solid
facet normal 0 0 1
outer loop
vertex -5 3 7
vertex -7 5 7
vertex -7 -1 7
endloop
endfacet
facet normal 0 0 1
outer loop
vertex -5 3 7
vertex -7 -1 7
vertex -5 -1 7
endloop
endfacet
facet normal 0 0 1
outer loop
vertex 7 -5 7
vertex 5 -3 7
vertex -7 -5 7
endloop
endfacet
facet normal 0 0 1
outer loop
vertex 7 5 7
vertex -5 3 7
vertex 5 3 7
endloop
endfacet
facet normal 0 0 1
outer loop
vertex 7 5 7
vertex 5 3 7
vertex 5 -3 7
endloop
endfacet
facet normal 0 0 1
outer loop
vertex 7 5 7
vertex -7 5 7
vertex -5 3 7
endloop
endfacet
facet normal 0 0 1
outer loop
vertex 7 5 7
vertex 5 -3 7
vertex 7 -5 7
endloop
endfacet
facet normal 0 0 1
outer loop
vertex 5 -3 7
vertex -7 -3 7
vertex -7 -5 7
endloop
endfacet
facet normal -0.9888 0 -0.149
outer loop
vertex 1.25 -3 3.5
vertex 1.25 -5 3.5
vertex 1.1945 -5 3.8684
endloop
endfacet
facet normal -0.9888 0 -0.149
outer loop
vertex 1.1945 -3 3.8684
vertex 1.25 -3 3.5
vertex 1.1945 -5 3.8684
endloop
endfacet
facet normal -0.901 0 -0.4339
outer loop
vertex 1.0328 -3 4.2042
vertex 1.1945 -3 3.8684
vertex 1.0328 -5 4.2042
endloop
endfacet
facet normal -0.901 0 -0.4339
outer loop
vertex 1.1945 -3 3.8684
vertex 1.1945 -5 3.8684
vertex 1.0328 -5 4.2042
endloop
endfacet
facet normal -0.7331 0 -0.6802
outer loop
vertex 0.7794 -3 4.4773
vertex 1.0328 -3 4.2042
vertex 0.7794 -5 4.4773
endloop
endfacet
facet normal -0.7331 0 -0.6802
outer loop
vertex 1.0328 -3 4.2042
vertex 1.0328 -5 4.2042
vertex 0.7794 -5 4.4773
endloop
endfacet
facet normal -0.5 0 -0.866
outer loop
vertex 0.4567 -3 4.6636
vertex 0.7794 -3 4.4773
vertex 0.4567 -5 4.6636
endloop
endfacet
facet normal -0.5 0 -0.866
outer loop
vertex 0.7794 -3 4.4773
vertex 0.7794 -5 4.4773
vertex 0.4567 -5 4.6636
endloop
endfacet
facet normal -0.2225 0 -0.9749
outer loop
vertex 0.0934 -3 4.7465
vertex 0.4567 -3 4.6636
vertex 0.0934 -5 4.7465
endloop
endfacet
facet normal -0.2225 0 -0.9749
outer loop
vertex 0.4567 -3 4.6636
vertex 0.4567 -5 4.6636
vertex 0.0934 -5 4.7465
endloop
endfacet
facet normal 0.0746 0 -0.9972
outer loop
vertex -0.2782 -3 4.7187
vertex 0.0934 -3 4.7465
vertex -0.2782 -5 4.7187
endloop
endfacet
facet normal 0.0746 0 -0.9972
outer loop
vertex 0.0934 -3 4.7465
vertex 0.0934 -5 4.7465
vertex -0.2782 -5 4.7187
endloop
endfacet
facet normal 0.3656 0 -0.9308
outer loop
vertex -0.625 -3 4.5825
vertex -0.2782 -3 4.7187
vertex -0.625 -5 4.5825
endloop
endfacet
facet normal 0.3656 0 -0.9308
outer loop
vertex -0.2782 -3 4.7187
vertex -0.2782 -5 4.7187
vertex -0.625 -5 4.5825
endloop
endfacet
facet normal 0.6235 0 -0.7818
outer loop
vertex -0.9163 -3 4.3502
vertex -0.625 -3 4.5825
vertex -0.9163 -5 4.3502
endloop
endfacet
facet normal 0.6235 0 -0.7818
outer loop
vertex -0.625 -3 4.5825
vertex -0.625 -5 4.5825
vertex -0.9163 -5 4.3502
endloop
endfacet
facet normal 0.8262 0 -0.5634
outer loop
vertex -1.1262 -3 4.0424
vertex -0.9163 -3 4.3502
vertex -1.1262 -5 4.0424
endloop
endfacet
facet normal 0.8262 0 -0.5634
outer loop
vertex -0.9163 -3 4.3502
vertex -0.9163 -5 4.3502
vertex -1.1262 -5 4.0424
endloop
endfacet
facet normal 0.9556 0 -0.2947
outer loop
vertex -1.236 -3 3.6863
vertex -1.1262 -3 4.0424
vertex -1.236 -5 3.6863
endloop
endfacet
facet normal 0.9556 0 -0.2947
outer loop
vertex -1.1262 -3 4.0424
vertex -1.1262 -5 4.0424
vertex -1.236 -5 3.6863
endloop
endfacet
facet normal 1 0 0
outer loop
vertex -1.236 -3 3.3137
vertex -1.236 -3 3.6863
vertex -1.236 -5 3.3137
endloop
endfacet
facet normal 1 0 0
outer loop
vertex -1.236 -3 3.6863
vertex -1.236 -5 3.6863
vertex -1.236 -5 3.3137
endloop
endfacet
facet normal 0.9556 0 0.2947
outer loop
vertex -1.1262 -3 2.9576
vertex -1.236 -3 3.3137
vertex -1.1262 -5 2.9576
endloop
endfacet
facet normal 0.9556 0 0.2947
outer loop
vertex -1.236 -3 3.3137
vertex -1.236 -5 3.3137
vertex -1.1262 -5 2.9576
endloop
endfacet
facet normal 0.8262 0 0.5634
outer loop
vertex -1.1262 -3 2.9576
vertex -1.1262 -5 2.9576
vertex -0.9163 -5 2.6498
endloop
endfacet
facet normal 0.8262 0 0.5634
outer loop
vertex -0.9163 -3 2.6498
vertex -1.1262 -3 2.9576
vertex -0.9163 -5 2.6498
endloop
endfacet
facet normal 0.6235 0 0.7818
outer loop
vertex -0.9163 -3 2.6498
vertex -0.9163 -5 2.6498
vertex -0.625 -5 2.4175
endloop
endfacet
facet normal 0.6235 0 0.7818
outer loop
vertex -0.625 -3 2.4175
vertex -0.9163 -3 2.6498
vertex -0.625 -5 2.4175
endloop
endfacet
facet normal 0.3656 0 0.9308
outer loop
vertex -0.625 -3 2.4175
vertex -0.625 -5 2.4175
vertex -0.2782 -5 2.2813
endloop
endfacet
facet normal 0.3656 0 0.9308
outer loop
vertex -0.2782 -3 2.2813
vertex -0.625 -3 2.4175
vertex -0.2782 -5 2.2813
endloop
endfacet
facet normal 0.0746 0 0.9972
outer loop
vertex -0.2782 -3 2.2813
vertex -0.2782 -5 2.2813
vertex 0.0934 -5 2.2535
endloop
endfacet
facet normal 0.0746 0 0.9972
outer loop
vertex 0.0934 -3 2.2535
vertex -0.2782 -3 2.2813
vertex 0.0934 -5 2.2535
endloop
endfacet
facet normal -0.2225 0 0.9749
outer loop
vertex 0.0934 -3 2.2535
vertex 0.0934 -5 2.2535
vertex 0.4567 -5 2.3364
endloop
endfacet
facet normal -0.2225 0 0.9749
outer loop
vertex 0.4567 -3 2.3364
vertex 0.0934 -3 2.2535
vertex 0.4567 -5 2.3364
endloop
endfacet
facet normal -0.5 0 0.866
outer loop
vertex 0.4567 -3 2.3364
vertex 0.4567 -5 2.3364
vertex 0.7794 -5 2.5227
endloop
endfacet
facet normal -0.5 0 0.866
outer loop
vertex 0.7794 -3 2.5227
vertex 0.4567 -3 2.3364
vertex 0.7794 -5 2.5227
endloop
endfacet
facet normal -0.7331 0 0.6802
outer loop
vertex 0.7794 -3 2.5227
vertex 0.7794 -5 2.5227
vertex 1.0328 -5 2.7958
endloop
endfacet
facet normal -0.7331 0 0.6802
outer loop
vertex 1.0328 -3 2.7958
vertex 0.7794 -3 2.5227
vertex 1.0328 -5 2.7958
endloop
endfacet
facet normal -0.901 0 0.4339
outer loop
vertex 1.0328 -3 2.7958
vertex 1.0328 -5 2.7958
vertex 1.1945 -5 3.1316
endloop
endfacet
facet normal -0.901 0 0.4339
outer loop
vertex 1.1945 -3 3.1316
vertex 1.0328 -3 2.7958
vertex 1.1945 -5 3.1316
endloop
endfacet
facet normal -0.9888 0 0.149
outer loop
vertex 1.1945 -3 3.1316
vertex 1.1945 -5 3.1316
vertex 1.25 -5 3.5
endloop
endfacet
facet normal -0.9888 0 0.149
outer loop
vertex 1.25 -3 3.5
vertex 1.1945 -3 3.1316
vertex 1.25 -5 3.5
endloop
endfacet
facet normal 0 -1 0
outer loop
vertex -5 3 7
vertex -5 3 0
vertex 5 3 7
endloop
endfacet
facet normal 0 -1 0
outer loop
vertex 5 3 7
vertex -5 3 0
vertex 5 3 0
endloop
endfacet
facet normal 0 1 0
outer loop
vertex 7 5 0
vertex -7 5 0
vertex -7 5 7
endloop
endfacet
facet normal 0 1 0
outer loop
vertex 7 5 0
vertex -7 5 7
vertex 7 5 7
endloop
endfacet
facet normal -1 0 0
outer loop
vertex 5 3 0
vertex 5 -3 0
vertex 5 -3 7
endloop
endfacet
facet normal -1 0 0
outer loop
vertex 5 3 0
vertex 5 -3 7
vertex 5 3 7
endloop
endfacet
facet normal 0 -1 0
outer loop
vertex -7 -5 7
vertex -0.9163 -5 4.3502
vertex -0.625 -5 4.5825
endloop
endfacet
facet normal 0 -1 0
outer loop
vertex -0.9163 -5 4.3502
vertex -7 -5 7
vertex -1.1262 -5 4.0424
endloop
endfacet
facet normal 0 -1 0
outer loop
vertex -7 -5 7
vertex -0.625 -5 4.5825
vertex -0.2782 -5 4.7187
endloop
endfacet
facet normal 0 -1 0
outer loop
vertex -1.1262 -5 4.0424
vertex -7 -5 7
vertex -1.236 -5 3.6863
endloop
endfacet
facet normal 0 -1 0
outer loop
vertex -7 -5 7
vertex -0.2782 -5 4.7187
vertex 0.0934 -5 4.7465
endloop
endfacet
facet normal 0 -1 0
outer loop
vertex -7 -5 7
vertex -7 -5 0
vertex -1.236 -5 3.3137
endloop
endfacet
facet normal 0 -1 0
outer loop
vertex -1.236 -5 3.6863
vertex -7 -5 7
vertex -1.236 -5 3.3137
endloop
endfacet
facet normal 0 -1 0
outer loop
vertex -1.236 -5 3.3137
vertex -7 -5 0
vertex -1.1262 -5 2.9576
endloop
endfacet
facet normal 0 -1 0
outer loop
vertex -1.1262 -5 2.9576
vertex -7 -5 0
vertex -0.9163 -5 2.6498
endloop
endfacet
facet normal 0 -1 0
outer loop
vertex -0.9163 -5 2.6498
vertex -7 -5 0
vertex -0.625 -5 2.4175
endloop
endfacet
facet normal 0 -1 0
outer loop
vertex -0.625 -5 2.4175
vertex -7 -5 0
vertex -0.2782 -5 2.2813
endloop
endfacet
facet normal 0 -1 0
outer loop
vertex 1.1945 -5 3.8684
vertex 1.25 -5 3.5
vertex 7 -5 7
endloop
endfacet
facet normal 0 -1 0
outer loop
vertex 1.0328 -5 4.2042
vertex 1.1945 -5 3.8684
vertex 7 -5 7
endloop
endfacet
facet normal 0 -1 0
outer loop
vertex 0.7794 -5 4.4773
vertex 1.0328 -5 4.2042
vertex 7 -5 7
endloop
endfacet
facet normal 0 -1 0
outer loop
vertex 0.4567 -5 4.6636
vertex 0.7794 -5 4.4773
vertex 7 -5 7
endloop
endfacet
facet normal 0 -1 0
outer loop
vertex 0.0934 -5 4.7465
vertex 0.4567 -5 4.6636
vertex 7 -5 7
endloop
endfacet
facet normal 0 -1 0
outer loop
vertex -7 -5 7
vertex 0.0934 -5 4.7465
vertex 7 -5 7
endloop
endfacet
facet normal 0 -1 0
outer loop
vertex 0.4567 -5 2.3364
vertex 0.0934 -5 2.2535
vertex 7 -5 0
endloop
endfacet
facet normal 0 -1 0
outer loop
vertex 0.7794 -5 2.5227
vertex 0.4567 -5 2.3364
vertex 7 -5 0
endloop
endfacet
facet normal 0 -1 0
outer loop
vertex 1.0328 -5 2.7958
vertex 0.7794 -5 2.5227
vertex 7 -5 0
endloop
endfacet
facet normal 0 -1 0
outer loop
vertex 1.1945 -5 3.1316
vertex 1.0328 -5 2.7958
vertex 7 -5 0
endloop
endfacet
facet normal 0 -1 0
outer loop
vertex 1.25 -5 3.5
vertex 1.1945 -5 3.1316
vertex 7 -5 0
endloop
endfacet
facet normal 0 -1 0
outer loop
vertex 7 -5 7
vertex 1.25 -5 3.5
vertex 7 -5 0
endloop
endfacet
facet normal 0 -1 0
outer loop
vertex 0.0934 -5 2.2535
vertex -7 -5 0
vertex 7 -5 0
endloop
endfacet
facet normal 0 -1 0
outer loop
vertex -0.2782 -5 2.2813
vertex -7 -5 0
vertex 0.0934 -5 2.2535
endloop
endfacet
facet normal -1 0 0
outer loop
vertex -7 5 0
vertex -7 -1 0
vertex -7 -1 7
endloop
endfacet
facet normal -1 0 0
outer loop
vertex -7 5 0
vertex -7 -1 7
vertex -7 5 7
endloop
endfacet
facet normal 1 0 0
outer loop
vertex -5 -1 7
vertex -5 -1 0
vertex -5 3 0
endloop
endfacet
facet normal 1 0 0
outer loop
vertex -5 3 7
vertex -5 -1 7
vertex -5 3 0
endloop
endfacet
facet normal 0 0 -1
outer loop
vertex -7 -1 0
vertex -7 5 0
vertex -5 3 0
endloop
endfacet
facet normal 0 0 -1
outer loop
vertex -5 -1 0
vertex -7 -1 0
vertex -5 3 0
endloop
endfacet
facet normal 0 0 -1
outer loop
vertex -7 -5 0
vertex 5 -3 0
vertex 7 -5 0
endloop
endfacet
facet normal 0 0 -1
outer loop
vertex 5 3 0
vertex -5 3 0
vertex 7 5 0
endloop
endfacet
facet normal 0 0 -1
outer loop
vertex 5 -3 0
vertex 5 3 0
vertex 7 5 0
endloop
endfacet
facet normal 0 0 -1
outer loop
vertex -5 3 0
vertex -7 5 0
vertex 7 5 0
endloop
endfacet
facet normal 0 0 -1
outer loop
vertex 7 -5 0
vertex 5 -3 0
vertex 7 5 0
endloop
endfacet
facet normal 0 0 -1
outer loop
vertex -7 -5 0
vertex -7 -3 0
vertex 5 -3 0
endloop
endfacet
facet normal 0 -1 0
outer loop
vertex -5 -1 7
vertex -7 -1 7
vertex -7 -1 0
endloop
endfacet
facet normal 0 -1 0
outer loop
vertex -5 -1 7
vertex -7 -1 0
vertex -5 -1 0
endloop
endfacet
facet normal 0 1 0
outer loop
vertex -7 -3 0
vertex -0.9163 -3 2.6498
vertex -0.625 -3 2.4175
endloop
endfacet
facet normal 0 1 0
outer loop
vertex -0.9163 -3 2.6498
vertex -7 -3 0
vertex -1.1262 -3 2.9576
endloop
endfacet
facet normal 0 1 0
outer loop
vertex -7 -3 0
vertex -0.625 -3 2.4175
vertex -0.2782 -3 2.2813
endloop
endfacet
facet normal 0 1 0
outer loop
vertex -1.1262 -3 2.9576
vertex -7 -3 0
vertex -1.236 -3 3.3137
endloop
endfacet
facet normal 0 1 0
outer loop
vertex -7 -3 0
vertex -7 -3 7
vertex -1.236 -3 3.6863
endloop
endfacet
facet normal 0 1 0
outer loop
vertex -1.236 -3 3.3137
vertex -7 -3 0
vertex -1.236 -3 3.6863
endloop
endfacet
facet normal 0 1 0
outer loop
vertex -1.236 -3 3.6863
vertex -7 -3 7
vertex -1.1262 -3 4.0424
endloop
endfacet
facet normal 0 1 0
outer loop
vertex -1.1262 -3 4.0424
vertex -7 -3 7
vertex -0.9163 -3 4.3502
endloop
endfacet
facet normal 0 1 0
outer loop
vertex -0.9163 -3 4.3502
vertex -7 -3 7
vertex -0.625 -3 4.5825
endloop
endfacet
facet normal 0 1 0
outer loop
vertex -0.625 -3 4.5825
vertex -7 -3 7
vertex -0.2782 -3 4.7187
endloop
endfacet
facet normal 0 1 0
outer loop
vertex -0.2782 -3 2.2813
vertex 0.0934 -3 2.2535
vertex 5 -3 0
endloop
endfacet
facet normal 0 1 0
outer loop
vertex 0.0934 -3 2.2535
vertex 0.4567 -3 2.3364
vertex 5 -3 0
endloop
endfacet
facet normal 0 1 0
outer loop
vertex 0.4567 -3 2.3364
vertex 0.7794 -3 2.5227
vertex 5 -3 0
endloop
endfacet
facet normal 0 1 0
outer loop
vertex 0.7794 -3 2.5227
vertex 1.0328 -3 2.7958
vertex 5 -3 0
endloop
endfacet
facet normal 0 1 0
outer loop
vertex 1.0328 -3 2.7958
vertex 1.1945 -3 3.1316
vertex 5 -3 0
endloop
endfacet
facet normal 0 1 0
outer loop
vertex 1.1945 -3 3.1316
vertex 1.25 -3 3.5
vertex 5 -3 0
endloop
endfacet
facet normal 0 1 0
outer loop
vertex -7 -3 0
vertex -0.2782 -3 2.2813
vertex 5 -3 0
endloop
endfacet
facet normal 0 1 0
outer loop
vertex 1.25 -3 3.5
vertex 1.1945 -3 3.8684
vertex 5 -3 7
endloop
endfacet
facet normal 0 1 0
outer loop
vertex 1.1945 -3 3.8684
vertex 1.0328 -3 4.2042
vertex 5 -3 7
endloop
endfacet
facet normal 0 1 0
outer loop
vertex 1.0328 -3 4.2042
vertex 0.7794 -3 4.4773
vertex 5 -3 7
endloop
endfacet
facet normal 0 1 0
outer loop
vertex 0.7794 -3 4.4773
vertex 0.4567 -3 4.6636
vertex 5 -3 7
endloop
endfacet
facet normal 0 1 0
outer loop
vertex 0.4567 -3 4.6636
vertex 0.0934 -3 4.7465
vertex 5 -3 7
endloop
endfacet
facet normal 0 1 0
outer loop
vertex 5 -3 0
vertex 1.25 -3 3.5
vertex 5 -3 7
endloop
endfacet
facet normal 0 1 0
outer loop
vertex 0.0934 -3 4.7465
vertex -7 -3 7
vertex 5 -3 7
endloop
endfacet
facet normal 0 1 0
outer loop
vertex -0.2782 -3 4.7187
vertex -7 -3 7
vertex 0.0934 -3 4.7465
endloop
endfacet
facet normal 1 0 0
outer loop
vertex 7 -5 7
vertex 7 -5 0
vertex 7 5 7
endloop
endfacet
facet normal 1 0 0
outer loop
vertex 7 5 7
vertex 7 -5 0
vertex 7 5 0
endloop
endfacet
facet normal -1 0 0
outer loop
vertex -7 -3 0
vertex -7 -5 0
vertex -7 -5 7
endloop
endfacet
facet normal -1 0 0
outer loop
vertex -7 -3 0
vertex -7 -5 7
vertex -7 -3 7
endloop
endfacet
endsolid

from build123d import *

# Parameters (mm, degrees)
F0_W     = 14
F0_H     = 10
F0_W_2   = 10
F0_H_2   = 6
F1_DEPTH = 7
F2_W     = 2
F2_H     = 2
F3_DEPTH = 10
F4_R     = 1.25
F5_DEPTH = 5


with BuildPart() as f1:
    # F0 (on Top) → F1 (new body)
    with BuildSketch(Plane.XY):
        Rectangle(F0_W, F0_H)
        Rectangle(F0_W_2, F0_H_2, mode=Mode.SUBTRACT)
    extrude(amount=F1_DEPTH)

    # F2 (on face) → F3 (cut)
    with BuildSketch(Plane.XY.offset(7)):
        with Locations((-6, -2)):
            Rectangle(F2_W, F2_H)
    extrude(amount=-F3_DEPTH, mode=Mode.SUBTRACT)

    # F4 (on face) → F5 (cut)
    with BuildSketch(Plane.XZ.offset(5)):
        with Locations((0, 3.5)):
            Circle(F4_R)
    extrude(amount=-F5_DEPTH, mode=Mode.SUBTRACT)


solid = f1.part
